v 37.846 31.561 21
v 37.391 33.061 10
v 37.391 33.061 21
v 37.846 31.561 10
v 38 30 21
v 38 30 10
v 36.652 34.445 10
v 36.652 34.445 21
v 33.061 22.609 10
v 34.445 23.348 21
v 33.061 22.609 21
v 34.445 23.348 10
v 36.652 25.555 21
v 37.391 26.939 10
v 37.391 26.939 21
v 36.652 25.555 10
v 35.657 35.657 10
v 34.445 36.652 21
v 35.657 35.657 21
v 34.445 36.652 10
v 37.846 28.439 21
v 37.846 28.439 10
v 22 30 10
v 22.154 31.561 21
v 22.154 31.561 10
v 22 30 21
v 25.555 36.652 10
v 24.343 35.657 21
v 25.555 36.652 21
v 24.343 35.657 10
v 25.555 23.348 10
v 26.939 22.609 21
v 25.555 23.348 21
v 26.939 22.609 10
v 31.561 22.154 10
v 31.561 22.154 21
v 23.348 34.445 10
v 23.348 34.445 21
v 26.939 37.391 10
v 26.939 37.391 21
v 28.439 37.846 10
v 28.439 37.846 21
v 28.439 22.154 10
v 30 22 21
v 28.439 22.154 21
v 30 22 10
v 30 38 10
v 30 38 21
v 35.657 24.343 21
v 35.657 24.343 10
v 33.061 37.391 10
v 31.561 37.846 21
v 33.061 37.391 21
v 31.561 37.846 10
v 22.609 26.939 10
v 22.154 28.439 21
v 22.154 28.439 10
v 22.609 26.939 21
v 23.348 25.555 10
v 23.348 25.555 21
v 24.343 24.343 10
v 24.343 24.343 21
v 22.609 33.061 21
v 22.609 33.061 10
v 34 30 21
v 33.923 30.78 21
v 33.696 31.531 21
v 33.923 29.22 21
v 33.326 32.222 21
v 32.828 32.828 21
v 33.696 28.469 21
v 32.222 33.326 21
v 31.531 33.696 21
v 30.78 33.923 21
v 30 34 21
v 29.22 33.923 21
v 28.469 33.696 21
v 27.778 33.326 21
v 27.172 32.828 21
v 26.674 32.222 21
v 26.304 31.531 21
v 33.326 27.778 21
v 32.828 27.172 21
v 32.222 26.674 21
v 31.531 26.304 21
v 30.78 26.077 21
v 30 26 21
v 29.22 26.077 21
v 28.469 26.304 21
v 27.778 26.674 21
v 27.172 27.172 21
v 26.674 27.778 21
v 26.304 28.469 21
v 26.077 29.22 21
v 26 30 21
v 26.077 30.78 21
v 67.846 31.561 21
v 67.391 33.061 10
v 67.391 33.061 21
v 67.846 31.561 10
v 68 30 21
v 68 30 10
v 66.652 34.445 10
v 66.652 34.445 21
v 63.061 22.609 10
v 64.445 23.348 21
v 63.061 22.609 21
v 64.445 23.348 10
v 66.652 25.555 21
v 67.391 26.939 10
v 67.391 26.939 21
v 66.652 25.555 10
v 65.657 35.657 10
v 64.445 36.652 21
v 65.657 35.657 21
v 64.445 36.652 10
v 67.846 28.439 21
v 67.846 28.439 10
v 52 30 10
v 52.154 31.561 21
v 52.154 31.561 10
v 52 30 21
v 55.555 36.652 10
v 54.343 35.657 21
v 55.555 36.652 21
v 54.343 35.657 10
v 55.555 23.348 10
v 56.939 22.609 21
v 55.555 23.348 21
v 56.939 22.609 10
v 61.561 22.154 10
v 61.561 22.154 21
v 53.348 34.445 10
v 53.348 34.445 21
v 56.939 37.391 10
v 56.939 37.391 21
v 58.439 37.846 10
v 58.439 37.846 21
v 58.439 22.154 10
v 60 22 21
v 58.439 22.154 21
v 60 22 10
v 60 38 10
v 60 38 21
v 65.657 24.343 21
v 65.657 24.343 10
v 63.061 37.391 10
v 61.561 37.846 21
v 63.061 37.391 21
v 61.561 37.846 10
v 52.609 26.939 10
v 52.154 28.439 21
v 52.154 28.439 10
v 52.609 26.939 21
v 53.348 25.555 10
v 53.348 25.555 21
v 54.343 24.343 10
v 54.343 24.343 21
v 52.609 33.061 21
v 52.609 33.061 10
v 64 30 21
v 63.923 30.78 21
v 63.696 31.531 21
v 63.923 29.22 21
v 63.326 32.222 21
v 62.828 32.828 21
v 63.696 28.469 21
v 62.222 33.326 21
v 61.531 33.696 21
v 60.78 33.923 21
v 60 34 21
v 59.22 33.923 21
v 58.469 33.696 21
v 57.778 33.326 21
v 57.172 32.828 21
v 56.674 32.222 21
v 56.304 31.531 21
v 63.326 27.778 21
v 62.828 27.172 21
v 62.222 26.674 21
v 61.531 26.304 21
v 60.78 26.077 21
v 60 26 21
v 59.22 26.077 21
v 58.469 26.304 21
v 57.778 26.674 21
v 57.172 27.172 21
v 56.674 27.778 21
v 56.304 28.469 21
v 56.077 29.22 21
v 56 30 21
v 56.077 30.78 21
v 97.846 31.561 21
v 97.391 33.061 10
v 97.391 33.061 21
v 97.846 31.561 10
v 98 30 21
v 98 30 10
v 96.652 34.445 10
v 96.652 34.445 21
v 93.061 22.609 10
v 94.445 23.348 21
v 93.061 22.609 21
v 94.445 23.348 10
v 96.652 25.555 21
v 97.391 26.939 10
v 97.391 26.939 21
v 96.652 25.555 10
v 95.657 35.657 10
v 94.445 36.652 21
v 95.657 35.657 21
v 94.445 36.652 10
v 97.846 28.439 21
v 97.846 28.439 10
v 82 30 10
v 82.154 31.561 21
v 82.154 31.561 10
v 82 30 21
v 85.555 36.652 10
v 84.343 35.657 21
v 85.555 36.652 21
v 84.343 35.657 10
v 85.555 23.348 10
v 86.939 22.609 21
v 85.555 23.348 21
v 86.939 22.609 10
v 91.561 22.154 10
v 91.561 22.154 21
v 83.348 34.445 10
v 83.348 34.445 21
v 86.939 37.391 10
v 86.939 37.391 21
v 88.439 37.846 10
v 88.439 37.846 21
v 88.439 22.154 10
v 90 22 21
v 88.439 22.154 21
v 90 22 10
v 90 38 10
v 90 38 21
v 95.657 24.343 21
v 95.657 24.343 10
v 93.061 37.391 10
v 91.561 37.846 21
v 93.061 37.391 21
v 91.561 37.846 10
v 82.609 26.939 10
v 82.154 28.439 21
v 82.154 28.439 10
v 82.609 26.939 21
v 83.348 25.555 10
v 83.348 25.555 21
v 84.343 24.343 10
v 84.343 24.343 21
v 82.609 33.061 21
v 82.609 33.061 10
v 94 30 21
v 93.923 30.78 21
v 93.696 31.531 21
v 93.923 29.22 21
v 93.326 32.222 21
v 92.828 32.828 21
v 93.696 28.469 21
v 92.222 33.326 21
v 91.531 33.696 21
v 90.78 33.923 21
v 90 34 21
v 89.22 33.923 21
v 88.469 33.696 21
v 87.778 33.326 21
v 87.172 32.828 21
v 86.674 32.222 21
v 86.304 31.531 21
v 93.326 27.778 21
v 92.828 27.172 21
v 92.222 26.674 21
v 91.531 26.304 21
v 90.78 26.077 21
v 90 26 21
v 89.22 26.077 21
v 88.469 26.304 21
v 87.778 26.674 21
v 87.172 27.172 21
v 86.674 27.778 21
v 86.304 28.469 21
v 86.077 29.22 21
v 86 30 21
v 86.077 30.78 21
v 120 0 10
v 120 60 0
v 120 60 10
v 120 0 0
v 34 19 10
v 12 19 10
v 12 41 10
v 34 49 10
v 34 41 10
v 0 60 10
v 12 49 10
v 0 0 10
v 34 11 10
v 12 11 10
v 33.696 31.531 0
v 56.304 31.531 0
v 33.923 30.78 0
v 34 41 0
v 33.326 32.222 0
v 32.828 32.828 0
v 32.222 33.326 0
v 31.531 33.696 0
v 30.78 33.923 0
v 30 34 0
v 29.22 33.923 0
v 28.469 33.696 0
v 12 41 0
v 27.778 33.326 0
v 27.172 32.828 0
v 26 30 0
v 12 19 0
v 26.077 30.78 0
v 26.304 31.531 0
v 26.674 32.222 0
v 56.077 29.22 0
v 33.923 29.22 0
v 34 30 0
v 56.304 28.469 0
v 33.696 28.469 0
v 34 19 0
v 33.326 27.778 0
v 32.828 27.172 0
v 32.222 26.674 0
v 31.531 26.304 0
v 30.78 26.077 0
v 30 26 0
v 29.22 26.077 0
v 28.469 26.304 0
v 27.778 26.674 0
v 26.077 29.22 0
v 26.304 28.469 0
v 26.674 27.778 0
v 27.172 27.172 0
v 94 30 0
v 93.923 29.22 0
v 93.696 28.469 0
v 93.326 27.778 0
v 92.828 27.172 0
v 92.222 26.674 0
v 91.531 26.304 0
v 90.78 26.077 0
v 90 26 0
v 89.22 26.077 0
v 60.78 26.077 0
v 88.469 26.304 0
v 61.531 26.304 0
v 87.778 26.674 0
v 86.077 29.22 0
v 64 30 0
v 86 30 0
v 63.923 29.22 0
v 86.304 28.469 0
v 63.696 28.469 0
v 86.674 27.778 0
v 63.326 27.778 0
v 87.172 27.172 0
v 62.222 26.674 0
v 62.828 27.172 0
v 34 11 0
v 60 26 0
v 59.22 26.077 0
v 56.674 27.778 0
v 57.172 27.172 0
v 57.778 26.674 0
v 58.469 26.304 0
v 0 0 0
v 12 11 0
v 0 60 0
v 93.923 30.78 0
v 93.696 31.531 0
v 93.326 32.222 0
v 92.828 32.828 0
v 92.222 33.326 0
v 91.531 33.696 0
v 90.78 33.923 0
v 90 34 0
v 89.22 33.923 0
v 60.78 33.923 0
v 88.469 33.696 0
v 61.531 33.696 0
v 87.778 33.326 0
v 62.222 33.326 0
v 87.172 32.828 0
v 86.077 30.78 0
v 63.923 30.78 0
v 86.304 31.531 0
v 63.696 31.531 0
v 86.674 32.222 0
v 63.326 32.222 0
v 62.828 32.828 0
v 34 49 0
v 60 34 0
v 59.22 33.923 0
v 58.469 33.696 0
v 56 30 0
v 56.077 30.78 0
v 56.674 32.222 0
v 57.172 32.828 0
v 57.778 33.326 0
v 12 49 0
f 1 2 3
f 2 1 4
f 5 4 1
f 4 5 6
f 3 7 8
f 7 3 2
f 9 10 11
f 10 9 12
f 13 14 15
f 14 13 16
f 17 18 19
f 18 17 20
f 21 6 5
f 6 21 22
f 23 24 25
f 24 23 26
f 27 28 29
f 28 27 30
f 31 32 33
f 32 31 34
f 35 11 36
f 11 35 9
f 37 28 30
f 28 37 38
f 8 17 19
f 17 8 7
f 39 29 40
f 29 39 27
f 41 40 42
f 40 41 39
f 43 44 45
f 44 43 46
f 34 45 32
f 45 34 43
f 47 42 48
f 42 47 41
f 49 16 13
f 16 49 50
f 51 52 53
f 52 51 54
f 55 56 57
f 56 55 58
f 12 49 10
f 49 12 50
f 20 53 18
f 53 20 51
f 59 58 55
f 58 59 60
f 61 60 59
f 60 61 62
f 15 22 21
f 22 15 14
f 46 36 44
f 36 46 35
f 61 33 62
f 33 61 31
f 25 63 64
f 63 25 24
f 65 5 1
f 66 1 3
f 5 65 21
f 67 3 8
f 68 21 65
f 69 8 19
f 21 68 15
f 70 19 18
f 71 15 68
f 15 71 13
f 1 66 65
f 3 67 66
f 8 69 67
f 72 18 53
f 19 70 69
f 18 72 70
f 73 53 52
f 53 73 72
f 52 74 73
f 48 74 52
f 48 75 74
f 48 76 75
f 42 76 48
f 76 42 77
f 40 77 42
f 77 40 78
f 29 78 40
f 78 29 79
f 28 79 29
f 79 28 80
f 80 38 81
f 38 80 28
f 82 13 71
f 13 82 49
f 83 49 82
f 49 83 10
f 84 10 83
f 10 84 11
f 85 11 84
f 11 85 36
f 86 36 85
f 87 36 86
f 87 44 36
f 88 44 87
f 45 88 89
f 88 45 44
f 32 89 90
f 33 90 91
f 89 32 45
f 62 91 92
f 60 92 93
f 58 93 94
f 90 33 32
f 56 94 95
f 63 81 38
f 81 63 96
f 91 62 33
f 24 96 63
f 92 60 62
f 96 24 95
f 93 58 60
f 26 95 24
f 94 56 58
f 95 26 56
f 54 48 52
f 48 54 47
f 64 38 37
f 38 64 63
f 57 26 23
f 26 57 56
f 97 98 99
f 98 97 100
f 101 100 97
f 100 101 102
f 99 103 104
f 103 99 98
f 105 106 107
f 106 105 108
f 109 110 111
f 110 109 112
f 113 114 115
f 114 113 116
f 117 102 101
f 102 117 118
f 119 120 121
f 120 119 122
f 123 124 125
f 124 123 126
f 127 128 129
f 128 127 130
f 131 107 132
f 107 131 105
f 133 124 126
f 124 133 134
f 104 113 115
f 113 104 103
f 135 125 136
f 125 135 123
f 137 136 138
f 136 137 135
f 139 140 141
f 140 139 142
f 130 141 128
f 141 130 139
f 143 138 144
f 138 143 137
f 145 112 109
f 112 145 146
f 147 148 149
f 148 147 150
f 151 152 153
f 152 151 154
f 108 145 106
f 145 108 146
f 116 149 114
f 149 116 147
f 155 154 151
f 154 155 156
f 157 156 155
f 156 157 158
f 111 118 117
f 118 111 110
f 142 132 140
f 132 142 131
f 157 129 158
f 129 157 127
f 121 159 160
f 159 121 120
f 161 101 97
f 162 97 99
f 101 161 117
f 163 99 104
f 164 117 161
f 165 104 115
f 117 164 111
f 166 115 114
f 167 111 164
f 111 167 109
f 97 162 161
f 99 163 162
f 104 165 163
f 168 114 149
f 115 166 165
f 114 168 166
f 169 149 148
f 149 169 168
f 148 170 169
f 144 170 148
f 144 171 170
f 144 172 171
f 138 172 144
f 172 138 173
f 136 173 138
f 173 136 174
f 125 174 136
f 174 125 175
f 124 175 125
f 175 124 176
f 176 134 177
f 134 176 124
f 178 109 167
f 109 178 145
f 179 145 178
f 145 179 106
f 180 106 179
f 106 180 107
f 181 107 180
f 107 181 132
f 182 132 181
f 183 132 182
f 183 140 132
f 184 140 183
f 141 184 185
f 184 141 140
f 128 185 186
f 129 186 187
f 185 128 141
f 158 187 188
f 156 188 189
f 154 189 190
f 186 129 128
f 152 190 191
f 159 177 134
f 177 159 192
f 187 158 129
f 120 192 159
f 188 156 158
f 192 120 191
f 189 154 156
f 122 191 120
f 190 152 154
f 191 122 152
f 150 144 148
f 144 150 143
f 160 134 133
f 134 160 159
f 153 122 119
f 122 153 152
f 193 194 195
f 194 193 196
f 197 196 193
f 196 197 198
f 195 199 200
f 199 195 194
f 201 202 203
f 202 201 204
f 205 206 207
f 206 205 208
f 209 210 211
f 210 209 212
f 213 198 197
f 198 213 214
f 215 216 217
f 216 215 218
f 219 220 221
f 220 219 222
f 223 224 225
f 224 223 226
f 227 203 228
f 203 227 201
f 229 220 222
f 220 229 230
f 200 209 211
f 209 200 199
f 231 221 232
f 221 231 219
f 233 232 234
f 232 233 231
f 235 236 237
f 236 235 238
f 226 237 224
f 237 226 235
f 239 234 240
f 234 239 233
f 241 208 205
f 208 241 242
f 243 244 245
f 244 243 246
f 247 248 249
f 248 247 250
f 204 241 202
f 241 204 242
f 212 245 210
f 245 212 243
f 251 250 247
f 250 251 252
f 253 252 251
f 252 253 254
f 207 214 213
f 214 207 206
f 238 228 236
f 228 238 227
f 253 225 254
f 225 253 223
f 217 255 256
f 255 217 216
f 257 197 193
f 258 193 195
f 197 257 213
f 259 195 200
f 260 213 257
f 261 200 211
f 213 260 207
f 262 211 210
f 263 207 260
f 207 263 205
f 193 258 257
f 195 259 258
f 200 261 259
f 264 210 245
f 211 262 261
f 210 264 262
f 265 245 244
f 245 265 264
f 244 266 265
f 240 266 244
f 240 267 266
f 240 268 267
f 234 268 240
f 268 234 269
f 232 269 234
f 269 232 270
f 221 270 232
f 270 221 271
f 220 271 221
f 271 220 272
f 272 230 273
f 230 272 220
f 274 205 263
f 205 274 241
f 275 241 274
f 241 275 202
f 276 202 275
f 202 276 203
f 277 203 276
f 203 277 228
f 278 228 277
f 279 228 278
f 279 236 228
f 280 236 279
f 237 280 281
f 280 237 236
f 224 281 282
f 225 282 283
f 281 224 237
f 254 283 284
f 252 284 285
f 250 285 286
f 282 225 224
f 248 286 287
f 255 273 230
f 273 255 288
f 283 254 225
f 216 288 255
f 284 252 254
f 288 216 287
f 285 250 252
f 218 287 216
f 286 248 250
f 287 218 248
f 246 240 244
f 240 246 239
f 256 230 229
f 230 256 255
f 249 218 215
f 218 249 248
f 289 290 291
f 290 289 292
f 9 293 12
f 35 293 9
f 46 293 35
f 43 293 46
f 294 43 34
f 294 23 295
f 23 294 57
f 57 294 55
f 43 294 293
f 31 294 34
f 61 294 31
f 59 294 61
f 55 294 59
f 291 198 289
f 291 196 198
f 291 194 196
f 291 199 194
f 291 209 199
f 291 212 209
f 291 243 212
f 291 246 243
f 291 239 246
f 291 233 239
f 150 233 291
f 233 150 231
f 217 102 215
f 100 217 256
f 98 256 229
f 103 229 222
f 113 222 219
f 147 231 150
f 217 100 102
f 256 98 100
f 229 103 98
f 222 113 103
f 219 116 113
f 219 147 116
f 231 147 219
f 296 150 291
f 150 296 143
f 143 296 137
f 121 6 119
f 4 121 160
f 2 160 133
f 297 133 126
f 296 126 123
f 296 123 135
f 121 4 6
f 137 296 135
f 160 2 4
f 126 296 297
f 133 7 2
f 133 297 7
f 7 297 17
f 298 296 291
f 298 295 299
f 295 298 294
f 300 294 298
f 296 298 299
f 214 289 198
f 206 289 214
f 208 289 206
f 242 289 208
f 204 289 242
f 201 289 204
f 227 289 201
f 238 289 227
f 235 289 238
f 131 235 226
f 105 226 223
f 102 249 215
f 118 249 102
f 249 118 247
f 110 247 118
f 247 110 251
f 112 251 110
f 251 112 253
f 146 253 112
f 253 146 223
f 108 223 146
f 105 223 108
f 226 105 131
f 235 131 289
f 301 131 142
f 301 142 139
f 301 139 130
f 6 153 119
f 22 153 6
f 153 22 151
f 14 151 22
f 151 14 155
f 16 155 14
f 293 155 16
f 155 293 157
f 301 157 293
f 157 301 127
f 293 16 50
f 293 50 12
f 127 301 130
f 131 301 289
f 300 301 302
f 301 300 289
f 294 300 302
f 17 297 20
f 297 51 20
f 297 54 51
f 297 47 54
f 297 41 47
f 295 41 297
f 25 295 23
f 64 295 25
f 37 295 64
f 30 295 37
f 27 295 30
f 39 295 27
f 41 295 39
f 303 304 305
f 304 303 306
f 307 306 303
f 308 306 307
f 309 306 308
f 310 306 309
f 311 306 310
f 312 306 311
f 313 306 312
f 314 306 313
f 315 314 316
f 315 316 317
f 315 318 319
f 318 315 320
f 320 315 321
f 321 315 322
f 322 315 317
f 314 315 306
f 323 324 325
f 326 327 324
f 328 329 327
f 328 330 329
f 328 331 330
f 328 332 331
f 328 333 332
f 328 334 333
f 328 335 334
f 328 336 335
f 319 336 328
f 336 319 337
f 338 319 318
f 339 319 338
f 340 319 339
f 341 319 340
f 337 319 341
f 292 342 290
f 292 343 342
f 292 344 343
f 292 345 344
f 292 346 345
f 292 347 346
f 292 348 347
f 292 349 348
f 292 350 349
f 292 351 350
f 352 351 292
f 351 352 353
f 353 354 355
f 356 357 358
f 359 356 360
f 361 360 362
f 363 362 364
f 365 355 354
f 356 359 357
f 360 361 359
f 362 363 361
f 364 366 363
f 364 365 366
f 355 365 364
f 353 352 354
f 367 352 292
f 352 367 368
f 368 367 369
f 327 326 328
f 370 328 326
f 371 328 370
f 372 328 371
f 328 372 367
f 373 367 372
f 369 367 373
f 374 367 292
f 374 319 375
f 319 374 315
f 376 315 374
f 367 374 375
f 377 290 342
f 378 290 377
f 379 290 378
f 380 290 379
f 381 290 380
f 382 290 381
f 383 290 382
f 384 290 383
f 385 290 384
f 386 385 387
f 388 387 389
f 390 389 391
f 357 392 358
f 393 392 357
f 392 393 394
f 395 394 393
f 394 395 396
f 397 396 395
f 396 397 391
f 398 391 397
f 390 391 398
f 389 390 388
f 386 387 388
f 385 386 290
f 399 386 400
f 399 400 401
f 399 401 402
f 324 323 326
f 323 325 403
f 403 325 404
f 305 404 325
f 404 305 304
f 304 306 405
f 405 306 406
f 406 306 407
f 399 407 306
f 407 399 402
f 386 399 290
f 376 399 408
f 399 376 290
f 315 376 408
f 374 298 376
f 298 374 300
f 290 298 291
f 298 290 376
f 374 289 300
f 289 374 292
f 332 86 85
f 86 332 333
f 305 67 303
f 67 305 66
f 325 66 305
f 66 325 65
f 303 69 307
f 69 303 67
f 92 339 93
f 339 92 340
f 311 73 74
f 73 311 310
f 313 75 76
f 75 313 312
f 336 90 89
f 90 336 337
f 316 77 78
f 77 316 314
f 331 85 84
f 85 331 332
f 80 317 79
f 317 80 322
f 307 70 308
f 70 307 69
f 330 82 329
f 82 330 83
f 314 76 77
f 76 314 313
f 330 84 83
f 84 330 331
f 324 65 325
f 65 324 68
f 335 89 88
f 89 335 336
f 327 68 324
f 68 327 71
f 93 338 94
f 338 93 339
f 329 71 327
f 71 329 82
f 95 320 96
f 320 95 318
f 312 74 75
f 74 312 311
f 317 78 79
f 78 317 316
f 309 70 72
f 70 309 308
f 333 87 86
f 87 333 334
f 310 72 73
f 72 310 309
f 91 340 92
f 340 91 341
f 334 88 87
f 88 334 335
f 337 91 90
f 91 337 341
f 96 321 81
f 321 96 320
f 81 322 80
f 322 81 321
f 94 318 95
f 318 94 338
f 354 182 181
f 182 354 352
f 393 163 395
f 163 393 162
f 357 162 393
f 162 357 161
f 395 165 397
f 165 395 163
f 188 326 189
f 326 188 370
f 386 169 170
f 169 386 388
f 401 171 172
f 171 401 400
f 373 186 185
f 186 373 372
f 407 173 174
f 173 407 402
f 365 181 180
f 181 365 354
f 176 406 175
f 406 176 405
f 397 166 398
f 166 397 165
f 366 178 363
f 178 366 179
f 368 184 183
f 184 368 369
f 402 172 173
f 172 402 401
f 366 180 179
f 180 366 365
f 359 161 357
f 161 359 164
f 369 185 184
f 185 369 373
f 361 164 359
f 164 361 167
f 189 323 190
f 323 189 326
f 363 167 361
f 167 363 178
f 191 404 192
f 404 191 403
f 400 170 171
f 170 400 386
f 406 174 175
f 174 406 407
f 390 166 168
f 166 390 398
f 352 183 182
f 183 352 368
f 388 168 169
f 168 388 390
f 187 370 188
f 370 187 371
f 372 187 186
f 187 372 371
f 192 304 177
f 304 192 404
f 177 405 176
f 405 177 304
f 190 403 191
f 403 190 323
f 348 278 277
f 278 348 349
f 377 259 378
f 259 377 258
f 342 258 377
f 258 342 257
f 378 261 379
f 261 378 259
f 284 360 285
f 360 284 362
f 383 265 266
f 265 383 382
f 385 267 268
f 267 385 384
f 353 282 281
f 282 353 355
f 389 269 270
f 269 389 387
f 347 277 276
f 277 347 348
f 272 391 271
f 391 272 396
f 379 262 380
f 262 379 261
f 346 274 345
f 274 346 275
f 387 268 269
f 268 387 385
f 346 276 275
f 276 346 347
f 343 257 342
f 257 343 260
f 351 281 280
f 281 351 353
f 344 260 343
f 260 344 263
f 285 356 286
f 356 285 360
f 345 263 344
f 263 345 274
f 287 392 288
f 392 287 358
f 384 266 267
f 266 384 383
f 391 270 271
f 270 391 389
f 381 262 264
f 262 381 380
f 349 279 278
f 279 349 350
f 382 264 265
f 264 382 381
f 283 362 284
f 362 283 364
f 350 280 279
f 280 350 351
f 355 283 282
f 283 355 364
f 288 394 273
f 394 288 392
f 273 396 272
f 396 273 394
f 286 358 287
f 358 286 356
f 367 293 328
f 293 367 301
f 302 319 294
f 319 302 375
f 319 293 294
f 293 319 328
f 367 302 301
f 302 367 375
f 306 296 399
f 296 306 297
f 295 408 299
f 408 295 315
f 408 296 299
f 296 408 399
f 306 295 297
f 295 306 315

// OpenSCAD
$fn = 32;

// ----------------------------------------------------------------------
// Drill jig: three_boss_slot jig
// ----------------------------------------------------------------------

// --- parameters (mm) ---
plate_l = 120;            // plate length, X
plate_w = 60;             // plate width, Y
plate_t = 10;             // plate thickness
boss_d = 16;              // guide boss diameter
boss_h = 12;              // boss height above the plate
guide_d = 8;              // guide hole diameter
boss_pitch = 30;          // boss pitch
slot_w = 8;               // clamp slot width
slot_l = 22;              // clamp slot length
slot_x = 12;              // slot start X

n_boss = 3;  // guide bosses
boss_x0 = (plate_l - (n_boss - 1) * boss_pitch) / 2;  // first boss X
boss_top = plate_t - 1 + boss_h;  // boss crown height
total_h = boss_top;  // overall height

difference() {
  union() {
  cube([plate_l, plate_w, plate_t]);
  for (i = [0 : n_boss - 1])
    translate([boss_x0 + i * boss_pitch, plate_w / 2, plate_t - 1])
      cylinder(h = boss_h, d = boss_d);
  }
  for (i = [0 : n_boss - 1])
    translate([boss_x0 + i * boss_pitch, plate_w / 2, -1])
      cylinder(h = plate_t + boss_h, d = guide_d);
  for (cy = [plate_w * 0.25, plate_w * 0.75])
    translate([slot_x, cy - slot_w / 2, -1])
      cube([slot_l, slot_w, plate_t + 2]);
}
